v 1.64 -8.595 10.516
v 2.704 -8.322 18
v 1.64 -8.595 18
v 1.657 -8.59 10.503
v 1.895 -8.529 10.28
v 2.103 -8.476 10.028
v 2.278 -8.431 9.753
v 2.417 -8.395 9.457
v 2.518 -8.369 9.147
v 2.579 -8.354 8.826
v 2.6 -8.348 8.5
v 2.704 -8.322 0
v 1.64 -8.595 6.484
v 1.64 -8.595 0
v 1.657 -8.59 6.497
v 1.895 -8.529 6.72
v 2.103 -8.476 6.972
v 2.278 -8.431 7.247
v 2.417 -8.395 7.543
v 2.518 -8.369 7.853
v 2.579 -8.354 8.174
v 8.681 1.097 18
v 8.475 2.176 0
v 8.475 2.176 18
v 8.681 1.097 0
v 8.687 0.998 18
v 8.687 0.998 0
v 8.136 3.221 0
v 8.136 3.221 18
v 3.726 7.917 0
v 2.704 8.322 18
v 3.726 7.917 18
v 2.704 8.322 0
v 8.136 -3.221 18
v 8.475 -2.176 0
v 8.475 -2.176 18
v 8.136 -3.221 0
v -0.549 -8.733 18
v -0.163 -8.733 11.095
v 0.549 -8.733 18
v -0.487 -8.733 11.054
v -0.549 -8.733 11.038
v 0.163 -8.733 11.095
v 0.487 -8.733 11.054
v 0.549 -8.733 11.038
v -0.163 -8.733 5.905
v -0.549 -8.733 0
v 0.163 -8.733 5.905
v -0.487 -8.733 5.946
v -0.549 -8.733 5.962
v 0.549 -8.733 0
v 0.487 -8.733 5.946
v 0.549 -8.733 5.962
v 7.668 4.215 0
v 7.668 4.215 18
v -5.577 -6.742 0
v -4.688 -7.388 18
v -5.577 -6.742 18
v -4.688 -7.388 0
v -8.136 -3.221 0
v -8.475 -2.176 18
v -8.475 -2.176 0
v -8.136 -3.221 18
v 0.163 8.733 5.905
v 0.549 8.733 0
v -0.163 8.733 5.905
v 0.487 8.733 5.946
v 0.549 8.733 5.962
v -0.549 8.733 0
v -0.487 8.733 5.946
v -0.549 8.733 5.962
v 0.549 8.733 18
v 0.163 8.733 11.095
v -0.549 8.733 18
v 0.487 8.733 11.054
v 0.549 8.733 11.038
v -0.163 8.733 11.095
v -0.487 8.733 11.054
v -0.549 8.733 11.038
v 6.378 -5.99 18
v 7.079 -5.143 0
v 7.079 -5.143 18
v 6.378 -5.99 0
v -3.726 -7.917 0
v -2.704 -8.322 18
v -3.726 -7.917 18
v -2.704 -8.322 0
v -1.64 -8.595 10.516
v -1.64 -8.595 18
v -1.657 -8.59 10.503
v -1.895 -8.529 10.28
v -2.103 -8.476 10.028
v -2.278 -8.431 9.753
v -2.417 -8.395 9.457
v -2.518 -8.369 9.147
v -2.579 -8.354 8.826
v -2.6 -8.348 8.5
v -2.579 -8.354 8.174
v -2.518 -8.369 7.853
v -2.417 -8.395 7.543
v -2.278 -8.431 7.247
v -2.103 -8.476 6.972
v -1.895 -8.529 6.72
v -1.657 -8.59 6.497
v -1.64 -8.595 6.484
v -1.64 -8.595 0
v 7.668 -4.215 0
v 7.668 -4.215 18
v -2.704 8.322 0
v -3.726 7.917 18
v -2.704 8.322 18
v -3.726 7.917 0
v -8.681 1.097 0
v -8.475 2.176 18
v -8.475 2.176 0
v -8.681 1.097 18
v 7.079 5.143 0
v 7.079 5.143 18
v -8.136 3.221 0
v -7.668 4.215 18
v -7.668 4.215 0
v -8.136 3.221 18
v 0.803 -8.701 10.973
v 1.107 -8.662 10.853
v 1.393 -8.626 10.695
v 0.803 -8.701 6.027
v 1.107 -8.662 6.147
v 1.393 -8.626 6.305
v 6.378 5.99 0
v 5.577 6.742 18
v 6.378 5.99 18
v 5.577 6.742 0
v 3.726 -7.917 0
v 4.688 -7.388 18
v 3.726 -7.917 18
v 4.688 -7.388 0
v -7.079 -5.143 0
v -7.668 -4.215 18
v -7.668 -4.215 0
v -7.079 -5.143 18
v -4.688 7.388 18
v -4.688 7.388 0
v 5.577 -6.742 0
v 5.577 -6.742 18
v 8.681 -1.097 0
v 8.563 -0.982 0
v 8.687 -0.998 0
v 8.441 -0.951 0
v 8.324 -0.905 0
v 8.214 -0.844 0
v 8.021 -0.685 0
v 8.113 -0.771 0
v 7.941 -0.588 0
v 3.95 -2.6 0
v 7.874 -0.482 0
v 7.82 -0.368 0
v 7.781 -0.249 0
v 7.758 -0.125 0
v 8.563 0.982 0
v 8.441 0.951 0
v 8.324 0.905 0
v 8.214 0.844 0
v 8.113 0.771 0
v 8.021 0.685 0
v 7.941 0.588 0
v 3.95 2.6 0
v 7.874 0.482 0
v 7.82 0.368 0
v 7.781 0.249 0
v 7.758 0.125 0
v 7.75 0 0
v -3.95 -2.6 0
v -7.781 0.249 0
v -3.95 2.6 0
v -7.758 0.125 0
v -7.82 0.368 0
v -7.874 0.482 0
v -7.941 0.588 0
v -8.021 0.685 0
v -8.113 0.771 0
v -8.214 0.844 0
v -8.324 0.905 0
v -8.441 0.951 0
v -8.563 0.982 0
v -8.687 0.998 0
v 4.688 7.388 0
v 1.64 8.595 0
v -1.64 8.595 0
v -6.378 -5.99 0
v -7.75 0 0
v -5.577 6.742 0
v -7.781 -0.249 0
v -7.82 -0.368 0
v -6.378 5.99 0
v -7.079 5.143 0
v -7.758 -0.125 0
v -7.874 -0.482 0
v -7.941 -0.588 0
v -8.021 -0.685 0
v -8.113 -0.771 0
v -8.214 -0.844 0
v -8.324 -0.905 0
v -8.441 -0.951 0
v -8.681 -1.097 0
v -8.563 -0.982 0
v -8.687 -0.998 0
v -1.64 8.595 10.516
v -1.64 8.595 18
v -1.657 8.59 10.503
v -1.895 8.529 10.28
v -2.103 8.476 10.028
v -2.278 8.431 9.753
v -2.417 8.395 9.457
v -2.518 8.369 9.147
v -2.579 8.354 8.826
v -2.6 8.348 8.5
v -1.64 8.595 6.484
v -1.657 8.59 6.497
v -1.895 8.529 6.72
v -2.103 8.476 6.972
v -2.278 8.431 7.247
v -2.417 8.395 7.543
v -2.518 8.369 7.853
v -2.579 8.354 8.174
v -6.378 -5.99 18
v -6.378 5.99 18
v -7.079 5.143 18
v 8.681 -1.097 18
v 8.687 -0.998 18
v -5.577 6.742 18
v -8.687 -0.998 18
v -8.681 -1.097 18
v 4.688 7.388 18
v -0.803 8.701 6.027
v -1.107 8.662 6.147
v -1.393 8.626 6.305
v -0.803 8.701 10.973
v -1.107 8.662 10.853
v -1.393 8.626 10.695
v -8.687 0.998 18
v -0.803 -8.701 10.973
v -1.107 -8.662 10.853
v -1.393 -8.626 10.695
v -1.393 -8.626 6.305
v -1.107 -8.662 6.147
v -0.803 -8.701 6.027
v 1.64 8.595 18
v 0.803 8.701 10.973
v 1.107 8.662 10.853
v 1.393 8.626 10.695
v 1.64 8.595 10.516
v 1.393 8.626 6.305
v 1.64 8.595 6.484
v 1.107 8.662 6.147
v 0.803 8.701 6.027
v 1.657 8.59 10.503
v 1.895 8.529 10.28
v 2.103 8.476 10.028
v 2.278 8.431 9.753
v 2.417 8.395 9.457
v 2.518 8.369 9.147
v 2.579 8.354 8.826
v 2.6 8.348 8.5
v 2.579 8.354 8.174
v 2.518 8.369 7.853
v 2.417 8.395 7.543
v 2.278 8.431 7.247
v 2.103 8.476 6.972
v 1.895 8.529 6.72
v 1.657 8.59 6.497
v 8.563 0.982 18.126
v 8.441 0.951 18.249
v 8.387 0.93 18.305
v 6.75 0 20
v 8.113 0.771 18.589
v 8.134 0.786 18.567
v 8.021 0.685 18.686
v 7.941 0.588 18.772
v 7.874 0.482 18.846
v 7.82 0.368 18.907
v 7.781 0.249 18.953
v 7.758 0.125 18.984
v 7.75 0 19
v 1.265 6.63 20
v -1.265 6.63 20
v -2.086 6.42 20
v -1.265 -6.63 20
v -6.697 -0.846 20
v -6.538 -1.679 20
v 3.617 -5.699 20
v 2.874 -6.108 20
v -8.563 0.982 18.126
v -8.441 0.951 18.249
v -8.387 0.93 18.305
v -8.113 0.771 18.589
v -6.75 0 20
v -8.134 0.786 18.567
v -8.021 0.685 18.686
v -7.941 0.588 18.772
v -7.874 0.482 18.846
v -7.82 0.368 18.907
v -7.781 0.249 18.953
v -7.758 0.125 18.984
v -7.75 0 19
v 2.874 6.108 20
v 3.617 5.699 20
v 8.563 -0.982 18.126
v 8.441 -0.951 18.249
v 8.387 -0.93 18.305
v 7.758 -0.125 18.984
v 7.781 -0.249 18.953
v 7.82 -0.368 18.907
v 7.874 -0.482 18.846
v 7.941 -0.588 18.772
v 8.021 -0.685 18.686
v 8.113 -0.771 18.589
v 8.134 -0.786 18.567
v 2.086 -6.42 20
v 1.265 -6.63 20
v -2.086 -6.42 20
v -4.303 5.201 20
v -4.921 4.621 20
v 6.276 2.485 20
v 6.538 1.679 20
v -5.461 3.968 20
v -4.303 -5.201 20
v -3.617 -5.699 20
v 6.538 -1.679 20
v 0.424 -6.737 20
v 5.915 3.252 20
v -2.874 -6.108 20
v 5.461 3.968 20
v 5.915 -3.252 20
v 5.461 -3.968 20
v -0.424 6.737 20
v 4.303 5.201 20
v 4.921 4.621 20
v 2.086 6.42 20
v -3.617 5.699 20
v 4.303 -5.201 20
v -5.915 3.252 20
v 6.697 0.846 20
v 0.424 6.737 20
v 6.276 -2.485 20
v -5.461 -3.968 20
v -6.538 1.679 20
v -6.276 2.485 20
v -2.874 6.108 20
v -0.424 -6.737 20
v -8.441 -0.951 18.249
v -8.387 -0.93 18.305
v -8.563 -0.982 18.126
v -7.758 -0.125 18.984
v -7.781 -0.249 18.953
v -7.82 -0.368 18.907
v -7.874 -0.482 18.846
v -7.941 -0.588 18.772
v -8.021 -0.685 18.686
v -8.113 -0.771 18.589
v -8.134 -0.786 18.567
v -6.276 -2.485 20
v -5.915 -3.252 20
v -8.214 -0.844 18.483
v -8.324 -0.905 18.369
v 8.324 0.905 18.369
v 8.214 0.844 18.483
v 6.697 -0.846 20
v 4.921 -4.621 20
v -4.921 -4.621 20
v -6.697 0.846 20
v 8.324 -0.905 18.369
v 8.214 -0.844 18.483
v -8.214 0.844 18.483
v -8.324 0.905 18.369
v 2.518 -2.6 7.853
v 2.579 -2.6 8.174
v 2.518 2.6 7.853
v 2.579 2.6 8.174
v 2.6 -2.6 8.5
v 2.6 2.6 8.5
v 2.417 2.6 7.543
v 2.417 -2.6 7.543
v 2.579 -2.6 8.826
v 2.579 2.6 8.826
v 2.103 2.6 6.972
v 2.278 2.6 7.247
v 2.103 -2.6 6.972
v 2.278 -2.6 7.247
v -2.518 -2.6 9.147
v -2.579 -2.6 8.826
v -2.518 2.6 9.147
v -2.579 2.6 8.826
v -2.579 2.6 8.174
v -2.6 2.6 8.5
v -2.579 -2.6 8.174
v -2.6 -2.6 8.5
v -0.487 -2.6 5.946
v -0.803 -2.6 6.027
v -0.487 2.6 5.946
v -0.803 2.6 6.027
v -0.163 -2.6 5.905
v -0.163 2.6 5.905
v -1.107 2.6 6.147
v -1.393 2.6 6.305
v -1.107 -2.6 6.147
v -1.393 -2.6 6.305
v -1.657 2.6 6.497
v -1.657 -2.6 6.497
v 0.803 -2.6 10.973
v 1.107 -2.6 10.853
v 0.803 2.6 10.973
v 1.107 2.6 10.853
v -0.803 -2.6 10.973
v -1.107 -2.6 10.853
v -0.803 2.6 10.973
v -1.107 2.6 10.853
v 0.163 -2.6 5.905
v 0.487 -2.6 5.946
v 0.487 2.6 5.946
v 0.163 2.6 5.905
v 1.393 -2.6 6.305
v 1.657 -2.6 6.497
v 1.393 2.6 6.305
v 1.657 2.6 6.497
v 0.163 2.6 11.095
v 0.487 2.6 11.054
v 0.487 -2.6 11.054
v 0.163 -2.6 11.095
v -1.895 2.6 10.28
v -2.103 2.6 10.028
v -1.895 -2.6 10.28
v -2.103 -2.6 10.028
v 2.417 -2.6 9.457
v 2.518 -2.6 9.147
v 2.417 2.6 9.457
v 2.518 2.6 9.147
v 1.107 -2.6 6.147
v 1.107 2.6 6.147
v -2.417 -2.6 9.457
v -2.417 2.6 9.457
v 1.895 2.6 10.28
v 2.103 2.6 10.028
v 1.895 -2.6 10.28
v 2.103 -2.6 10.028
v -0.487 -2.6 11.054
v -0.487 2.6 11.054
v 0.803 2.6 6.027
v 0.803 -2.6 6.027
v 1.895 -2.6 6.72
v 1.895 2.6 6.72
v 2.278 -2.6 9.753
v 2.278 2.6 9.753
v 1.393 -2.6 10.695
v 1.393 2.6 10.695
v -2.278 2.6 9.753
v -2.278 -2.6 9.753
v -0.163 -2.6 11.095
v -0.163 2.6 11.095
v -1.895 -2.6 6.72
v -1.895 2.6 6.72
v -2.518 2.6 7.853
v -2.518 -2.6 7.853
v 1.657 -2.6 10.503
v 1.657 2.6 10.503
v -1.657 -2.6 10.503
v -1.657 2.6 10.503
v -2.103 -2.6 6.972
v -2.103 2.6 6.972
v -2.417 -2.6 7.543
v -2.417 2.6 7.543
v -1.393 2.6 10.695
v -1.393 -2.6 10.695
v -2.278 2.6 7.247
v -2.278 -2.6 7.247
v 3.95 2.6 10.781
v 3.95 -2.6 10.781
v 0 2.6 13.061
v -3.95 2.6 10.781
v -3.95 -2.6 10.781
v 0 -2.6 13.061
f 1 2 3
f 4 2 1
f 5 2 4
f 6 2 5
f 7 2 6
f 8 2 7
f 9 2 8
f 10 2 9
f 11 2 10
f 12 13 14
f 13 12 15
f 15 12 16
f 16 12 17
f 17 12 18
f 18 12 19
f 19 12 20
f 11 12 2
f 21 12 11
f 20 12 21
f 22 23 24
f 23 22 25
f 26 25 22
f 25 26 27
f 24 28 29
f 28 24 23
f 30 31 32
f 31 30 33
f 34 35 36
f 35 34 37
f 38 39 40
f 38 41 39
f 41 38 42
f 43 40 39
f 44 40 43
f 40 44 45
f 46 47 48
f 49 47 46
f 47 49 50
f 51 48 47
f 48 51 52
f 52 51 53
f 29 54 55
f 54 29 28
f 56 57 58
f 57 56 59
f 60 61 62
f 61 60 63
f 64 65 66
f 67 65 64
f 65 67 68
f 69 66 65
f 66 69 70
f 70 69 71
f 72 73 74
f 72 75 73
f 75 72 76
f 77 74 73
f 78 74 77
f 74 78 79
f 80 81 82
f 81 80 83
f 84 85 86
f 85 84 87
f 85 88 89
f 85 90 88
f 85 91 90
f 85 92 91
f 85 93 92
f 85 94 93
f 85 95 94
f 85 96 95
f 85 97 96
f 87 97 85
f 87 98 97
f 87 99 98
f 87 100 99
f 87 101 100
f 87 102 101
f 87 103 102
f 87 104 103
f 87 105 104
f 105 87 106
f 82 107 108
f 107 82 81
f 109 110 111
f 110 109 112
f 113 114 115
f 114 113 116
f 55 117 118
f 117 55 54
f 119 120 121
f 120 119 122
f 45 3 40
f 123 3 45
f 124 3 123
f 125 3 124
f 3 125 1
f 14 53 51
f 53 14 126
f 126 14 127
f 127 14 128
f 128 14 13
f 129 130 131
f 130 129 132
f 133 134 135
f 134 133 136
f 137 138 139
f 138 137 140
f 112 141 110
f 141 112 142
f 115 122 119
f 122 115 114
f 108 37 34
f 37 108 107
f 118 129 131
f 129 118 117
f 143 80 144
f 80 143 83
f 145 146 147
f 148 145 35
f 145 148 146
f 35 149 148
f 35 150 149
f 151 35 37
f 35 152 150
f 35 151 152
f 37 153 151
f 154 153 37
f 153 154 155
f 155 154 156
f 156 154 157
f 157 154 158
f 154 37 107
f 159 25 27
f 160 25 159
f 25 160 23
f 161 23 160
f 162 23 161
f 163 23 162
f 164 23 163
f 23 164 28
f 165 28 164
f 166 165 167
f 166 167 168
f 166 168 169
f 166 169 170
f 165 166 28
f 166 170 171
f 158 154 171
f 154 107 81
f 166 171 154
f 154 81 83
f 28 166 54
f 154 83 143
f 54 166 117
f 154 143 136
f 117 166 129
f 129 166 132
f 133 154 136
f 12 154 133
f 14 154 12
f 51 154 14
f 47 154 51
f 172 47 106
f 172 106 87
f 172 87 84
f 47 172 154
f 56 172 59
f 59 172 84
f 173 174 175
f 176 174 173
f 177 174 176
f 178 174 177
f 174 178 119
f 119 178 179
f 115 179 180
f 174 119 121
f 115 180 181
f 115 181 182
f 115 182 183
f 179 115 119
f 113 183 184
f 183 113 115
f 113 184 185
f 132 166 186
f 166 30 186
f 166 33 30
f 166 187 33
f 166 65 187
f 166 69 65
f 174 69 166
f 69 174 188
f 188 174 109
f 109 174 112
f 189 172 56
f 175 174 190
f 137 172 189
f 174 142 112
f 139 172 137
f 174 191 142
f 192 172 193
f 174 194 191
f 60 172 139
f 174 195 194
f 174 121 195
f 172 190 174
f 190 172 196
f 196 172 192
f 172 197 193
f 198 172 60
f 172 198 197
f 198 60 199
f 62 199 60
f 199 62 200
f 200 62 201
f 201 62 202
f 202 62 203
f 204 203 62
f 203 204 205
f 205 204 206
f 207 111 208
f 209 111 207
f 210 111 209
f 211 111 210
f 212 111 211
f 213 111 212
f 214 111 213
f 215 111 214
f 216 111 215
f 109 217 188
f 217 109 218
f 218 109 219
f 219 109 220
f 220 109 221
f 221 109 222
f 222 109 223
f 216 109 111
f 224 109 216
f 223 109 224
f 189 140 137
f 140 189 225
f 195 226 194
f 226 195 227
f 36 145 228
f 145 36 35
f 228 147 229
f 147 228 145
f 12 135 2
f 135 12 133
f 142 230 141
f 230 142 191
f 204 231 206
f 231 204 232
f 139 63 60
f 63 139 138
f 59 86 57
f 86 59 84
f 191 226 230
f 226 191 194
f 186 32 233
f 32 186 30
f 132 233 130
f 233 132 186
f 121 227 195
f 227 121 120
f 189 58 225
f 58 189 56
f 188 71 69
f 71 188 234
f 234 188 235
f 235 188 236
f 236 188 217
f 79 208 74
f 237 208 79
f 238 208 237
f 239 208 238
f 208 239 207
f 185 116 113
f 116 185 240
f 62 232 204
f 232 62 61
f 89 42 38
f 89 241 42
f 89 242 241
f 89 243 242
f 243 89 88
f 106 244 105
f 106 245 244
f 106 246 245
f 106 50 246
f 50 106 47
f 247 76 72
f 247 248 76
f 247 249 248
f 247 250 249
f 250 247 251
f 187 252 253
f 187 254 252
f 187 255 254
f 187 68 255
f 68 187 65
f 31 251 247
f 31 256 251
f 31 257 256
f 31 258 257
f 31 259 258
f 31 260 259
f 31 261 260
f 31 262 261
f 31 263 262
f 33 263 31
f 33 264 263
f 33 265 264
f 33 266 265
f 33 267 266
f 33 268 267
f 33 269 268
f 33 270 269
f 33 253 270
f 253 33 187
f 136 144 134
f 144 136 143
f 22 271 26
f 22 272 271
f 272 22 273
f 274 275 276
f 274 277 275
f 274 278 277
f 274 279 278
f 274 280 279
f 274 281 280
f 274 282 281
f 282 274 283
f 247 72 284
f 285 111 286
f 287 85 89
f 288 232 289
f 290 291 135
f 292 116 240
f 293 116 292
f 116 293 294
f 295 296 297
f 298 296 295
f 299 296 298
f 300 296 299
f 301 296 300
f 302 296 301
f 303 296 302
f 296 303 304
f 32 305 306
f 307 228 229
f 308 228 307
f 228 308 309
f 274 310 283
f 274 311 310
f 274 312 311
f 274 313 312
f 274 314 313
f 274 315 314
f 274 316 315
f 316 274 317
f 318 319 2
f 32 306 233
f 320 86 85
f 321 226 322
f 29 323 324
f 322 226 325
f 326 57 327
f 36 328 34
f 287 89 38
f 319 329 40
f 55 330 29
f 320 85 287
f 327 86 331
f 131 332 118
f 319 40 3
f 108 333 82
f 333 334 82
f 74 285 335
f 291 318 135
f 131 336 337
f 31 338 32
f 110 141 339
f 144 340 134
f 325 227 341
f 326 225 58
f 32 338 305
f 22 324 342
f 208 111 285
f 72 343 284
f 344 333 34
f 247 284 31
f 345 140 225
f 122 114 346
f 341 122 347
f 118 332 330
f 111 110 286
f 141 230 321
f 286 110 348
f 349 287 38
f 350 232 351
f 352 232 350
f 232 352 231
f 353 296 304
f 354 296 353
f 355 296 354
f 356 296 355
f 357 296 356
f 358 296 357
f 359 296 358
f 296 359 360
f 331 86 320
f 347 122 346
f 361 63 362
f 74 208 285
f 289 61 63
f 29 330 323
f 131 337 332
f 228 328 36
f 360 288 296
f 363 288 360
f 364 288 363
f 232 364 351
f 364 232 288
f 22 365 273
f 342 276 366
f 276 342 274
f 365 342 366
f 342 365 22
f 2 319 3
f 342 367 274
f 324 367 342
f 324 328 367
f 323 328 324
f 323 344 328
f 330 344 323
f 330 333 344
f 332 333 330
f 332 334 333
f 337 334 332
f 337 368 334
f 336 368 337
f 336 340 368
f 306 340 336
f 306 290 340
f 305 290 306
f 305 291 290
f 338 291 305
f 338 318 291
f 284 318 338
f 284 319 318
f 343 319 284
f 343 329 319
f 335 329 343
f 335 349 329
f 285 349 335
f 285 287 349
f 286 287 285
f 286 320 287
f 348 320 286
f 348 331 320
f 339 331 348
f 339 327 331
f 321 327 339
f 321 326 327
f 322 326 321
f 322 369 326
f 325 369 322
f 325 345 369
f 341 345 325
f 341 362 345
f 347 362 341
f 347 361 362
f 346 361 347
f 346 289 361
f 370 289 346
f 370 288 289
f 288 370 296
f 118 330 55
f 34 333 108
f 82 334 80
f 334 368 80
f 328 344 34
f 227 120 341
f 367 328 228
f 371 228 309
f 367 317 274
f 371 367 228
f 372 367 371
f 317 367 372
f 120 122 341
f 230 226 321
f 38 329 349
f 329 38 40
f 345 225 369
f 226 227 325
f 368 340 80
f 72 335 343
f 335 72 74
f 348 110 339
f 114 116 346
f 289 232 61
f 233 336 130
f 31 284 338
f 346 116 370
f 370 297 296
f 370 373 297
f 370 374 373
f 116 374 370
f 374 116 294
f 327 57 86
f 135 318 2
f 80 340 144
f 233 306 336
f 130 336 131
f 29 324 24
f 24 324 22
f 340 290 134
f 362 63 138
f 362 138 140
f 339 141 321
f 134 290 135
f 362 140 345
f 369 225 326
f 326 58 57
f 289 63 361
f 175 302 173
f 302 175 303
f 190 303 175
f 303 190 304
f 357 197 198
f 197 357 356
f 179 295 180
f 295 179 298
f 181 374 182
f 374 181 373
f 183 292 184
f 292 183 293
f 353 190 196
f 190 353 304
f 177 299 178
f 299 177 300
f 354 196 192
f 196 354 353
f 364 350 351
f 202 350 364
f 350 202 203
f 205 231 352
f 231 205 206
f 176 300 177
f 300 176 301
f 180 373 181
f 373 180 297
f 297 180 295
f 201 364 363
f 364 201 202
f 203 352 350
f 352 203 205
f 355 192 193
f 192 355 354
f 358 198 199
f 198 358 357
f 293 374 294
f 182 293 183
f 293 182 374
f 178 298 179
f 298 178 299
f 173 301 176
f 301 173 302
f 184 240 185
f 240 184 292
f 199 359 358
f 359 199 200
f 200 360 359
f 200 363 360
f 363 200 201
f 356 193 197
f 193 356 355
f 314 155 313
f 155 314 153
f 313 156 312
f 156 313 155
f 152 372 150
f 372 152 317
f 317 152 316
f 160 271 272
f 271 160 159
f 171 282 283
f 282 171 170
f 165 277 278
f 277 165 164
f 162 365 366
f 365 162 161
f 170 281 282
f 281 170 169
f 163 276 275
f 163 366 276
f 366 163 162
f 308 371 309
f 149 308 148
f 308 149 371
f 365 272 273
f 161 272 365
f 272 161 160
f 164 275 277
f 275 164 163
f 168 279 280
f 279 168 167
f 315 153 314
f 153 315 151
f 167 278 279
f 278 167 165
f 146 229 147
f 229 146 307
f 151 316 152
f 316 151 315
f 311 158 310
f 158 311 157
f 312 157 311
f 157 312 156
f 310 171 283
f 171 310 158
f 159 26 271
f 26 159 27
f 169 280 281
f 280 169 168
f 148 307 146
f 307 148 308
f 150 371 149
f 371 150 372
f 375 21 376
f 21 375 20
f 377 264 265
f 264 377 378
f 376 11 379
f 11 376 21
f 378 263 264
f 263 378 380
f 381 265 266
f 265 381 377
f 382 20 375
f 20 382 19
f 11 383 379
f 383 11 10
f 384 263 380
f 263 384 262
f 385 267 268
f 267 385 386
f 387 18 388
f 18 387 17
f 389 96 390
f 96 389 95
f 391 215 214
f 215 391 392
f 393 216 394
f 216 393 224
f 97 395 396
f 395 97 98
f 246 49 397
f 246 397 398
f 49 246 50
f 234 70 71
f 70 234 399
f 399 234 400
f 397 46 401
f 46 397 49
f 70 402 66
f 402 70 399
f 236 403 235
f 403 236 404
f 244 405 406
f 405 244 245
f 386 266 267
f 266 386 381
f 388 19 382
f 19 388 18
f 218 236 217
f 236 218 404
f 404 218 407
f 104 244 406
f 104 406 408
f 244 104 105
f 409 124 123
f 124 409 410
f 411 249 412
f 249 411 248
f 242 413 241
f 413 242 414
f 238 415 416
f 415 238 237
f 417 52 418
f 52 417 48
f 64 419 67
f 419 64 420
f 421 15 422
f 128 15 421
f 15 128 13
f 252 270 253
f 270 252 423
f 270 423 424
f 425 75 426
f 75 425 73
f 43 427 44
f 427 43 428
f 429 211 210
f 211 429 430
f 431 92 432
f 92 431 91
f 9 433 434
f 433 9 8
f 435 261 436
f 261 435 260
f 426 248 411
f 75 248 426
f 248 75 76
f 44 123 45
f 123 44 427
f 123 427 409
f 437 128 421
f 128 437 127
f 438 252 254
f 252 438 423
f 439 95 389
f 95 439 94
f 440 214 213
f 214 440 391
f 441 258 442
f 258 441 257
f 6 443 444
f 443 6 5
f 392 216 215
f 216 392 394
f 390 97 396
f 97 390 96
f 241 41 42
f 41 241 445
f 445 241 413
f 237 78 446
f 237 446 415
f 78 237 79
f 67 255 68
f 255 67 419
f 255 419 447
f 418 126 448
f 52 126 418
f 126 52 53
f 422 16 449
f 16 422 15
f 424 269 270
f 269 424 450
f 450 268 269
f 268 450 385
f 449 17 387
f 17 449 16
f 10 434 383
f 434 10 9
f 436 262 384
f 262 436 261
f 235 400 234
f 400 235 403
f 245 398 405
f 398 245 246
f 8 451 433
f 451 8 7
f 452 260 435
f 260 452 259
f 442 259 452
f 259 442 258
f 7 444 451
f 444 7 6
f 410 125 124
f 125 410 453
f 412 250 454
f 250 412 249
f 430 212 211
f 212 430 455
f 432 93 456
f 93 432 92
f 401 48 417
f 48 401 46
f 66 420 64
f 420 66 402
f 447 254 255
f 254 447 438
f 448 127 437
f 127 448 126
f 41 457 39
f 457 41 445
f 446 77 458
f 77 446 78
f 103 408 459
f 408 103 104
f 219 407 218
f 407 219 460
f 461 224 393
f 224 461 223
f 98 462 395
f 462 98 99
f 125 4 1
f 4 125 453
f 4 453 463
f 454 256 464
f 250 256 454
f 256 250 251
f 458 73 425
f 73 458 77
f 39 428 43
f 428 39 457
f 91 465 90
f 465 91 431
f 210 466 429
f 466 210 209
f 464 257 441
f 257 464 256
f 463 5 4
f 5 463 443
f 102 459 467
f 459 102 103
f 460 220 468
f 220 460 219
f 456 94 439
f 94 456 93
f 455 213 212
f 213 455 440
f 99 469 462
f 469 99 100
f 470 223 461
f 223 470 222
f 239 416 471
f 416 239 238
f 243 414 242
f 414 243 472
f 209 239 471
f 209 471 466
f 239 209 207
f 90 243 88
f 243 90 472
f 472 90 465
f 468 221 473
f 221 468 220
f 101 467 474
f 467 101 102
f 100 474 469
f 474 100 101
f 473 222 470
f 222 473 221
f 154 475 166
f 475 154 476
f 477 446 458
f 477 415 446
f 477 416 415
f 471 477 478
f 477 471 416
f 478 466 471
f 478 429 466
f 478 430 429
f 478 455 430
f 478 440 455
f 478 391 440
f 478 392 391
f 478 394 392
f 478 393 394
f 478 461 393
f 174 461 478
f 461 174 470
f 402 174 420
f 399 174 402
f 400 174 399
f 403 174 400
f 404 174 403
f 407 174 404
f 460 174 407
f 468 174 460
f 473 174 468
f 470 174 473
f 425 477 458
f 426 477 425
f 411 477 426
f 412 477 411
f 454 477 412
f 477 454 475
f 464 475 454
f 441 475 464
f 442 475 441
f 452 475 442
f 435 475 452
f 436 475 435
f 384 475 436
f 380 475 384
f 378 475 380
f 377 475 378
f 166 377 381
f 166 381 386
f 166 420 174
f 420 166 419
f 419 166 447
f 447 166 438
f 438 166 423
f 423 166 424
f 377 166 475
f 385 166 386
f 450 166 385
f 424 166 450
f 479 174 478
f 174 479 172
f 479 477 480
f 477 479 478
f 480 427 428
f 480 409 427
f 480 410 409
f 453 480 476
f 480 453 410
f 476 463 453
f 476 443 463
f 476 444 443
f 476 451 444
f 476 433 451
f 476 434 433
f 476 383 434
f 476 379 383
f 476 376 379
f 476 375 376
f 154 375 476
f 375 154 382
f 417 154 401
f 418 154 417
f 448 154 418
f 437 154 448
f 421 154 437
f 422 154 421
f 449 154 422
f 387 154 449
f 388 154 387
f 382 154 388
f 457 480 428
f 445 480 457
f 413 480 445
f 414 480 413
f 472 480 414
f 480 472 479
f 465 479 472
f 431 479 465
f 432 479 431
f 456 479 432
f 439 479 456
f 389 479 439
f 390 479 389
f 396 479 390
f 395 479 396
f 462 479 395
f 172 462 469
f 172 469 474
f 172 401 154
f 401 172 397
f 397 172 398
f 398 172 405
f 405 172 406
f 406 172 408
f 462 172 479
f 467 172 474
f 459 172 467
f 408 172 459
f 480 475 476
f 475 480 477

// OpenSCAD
$fn=50;

dia=17.5;
length=20;
boltDia=5.2;
chamfer=2;
fudge=0.1;
nutS=7.7;
nutM=5;
nutSpcng=0.1;

difference(){
  union(){
    cylinder(d=dia,h=length-chamfer);
    translate([0,0,length-chamfer]) cylinder(d1=dia,d2=dia-chamfer*2,h=chamfer);
  }
  for (ix=[-1,1])
    translate([ix*dia/2,0,-fudge/2]) cylinder(d=chamfer,h=length+fudge);
  translate([0,0,8.5]) rotate([-90,0,0]){
    cylinder(d=boltDia,h=dia+fudge,center=true);
    hull(){
      rotate([0,0,30]) nut(nutS+nutSpcng*2,nutM+nutSpcng*2);
      translate([0,8.5,0]) rotate([0,0,30])  nut(nutS+nutSpcng*2,nutM+nutSpcng*2);;
      }
    }
}

*rotate([90,30,0]) nut(nutS,nutM);
module nut(s=7,m=2){
  nutODia=2*s/sqrt(3);
  translate([0,0,-m/2]) cylinder(d=nutODia,h=m,$fn=6);
}
